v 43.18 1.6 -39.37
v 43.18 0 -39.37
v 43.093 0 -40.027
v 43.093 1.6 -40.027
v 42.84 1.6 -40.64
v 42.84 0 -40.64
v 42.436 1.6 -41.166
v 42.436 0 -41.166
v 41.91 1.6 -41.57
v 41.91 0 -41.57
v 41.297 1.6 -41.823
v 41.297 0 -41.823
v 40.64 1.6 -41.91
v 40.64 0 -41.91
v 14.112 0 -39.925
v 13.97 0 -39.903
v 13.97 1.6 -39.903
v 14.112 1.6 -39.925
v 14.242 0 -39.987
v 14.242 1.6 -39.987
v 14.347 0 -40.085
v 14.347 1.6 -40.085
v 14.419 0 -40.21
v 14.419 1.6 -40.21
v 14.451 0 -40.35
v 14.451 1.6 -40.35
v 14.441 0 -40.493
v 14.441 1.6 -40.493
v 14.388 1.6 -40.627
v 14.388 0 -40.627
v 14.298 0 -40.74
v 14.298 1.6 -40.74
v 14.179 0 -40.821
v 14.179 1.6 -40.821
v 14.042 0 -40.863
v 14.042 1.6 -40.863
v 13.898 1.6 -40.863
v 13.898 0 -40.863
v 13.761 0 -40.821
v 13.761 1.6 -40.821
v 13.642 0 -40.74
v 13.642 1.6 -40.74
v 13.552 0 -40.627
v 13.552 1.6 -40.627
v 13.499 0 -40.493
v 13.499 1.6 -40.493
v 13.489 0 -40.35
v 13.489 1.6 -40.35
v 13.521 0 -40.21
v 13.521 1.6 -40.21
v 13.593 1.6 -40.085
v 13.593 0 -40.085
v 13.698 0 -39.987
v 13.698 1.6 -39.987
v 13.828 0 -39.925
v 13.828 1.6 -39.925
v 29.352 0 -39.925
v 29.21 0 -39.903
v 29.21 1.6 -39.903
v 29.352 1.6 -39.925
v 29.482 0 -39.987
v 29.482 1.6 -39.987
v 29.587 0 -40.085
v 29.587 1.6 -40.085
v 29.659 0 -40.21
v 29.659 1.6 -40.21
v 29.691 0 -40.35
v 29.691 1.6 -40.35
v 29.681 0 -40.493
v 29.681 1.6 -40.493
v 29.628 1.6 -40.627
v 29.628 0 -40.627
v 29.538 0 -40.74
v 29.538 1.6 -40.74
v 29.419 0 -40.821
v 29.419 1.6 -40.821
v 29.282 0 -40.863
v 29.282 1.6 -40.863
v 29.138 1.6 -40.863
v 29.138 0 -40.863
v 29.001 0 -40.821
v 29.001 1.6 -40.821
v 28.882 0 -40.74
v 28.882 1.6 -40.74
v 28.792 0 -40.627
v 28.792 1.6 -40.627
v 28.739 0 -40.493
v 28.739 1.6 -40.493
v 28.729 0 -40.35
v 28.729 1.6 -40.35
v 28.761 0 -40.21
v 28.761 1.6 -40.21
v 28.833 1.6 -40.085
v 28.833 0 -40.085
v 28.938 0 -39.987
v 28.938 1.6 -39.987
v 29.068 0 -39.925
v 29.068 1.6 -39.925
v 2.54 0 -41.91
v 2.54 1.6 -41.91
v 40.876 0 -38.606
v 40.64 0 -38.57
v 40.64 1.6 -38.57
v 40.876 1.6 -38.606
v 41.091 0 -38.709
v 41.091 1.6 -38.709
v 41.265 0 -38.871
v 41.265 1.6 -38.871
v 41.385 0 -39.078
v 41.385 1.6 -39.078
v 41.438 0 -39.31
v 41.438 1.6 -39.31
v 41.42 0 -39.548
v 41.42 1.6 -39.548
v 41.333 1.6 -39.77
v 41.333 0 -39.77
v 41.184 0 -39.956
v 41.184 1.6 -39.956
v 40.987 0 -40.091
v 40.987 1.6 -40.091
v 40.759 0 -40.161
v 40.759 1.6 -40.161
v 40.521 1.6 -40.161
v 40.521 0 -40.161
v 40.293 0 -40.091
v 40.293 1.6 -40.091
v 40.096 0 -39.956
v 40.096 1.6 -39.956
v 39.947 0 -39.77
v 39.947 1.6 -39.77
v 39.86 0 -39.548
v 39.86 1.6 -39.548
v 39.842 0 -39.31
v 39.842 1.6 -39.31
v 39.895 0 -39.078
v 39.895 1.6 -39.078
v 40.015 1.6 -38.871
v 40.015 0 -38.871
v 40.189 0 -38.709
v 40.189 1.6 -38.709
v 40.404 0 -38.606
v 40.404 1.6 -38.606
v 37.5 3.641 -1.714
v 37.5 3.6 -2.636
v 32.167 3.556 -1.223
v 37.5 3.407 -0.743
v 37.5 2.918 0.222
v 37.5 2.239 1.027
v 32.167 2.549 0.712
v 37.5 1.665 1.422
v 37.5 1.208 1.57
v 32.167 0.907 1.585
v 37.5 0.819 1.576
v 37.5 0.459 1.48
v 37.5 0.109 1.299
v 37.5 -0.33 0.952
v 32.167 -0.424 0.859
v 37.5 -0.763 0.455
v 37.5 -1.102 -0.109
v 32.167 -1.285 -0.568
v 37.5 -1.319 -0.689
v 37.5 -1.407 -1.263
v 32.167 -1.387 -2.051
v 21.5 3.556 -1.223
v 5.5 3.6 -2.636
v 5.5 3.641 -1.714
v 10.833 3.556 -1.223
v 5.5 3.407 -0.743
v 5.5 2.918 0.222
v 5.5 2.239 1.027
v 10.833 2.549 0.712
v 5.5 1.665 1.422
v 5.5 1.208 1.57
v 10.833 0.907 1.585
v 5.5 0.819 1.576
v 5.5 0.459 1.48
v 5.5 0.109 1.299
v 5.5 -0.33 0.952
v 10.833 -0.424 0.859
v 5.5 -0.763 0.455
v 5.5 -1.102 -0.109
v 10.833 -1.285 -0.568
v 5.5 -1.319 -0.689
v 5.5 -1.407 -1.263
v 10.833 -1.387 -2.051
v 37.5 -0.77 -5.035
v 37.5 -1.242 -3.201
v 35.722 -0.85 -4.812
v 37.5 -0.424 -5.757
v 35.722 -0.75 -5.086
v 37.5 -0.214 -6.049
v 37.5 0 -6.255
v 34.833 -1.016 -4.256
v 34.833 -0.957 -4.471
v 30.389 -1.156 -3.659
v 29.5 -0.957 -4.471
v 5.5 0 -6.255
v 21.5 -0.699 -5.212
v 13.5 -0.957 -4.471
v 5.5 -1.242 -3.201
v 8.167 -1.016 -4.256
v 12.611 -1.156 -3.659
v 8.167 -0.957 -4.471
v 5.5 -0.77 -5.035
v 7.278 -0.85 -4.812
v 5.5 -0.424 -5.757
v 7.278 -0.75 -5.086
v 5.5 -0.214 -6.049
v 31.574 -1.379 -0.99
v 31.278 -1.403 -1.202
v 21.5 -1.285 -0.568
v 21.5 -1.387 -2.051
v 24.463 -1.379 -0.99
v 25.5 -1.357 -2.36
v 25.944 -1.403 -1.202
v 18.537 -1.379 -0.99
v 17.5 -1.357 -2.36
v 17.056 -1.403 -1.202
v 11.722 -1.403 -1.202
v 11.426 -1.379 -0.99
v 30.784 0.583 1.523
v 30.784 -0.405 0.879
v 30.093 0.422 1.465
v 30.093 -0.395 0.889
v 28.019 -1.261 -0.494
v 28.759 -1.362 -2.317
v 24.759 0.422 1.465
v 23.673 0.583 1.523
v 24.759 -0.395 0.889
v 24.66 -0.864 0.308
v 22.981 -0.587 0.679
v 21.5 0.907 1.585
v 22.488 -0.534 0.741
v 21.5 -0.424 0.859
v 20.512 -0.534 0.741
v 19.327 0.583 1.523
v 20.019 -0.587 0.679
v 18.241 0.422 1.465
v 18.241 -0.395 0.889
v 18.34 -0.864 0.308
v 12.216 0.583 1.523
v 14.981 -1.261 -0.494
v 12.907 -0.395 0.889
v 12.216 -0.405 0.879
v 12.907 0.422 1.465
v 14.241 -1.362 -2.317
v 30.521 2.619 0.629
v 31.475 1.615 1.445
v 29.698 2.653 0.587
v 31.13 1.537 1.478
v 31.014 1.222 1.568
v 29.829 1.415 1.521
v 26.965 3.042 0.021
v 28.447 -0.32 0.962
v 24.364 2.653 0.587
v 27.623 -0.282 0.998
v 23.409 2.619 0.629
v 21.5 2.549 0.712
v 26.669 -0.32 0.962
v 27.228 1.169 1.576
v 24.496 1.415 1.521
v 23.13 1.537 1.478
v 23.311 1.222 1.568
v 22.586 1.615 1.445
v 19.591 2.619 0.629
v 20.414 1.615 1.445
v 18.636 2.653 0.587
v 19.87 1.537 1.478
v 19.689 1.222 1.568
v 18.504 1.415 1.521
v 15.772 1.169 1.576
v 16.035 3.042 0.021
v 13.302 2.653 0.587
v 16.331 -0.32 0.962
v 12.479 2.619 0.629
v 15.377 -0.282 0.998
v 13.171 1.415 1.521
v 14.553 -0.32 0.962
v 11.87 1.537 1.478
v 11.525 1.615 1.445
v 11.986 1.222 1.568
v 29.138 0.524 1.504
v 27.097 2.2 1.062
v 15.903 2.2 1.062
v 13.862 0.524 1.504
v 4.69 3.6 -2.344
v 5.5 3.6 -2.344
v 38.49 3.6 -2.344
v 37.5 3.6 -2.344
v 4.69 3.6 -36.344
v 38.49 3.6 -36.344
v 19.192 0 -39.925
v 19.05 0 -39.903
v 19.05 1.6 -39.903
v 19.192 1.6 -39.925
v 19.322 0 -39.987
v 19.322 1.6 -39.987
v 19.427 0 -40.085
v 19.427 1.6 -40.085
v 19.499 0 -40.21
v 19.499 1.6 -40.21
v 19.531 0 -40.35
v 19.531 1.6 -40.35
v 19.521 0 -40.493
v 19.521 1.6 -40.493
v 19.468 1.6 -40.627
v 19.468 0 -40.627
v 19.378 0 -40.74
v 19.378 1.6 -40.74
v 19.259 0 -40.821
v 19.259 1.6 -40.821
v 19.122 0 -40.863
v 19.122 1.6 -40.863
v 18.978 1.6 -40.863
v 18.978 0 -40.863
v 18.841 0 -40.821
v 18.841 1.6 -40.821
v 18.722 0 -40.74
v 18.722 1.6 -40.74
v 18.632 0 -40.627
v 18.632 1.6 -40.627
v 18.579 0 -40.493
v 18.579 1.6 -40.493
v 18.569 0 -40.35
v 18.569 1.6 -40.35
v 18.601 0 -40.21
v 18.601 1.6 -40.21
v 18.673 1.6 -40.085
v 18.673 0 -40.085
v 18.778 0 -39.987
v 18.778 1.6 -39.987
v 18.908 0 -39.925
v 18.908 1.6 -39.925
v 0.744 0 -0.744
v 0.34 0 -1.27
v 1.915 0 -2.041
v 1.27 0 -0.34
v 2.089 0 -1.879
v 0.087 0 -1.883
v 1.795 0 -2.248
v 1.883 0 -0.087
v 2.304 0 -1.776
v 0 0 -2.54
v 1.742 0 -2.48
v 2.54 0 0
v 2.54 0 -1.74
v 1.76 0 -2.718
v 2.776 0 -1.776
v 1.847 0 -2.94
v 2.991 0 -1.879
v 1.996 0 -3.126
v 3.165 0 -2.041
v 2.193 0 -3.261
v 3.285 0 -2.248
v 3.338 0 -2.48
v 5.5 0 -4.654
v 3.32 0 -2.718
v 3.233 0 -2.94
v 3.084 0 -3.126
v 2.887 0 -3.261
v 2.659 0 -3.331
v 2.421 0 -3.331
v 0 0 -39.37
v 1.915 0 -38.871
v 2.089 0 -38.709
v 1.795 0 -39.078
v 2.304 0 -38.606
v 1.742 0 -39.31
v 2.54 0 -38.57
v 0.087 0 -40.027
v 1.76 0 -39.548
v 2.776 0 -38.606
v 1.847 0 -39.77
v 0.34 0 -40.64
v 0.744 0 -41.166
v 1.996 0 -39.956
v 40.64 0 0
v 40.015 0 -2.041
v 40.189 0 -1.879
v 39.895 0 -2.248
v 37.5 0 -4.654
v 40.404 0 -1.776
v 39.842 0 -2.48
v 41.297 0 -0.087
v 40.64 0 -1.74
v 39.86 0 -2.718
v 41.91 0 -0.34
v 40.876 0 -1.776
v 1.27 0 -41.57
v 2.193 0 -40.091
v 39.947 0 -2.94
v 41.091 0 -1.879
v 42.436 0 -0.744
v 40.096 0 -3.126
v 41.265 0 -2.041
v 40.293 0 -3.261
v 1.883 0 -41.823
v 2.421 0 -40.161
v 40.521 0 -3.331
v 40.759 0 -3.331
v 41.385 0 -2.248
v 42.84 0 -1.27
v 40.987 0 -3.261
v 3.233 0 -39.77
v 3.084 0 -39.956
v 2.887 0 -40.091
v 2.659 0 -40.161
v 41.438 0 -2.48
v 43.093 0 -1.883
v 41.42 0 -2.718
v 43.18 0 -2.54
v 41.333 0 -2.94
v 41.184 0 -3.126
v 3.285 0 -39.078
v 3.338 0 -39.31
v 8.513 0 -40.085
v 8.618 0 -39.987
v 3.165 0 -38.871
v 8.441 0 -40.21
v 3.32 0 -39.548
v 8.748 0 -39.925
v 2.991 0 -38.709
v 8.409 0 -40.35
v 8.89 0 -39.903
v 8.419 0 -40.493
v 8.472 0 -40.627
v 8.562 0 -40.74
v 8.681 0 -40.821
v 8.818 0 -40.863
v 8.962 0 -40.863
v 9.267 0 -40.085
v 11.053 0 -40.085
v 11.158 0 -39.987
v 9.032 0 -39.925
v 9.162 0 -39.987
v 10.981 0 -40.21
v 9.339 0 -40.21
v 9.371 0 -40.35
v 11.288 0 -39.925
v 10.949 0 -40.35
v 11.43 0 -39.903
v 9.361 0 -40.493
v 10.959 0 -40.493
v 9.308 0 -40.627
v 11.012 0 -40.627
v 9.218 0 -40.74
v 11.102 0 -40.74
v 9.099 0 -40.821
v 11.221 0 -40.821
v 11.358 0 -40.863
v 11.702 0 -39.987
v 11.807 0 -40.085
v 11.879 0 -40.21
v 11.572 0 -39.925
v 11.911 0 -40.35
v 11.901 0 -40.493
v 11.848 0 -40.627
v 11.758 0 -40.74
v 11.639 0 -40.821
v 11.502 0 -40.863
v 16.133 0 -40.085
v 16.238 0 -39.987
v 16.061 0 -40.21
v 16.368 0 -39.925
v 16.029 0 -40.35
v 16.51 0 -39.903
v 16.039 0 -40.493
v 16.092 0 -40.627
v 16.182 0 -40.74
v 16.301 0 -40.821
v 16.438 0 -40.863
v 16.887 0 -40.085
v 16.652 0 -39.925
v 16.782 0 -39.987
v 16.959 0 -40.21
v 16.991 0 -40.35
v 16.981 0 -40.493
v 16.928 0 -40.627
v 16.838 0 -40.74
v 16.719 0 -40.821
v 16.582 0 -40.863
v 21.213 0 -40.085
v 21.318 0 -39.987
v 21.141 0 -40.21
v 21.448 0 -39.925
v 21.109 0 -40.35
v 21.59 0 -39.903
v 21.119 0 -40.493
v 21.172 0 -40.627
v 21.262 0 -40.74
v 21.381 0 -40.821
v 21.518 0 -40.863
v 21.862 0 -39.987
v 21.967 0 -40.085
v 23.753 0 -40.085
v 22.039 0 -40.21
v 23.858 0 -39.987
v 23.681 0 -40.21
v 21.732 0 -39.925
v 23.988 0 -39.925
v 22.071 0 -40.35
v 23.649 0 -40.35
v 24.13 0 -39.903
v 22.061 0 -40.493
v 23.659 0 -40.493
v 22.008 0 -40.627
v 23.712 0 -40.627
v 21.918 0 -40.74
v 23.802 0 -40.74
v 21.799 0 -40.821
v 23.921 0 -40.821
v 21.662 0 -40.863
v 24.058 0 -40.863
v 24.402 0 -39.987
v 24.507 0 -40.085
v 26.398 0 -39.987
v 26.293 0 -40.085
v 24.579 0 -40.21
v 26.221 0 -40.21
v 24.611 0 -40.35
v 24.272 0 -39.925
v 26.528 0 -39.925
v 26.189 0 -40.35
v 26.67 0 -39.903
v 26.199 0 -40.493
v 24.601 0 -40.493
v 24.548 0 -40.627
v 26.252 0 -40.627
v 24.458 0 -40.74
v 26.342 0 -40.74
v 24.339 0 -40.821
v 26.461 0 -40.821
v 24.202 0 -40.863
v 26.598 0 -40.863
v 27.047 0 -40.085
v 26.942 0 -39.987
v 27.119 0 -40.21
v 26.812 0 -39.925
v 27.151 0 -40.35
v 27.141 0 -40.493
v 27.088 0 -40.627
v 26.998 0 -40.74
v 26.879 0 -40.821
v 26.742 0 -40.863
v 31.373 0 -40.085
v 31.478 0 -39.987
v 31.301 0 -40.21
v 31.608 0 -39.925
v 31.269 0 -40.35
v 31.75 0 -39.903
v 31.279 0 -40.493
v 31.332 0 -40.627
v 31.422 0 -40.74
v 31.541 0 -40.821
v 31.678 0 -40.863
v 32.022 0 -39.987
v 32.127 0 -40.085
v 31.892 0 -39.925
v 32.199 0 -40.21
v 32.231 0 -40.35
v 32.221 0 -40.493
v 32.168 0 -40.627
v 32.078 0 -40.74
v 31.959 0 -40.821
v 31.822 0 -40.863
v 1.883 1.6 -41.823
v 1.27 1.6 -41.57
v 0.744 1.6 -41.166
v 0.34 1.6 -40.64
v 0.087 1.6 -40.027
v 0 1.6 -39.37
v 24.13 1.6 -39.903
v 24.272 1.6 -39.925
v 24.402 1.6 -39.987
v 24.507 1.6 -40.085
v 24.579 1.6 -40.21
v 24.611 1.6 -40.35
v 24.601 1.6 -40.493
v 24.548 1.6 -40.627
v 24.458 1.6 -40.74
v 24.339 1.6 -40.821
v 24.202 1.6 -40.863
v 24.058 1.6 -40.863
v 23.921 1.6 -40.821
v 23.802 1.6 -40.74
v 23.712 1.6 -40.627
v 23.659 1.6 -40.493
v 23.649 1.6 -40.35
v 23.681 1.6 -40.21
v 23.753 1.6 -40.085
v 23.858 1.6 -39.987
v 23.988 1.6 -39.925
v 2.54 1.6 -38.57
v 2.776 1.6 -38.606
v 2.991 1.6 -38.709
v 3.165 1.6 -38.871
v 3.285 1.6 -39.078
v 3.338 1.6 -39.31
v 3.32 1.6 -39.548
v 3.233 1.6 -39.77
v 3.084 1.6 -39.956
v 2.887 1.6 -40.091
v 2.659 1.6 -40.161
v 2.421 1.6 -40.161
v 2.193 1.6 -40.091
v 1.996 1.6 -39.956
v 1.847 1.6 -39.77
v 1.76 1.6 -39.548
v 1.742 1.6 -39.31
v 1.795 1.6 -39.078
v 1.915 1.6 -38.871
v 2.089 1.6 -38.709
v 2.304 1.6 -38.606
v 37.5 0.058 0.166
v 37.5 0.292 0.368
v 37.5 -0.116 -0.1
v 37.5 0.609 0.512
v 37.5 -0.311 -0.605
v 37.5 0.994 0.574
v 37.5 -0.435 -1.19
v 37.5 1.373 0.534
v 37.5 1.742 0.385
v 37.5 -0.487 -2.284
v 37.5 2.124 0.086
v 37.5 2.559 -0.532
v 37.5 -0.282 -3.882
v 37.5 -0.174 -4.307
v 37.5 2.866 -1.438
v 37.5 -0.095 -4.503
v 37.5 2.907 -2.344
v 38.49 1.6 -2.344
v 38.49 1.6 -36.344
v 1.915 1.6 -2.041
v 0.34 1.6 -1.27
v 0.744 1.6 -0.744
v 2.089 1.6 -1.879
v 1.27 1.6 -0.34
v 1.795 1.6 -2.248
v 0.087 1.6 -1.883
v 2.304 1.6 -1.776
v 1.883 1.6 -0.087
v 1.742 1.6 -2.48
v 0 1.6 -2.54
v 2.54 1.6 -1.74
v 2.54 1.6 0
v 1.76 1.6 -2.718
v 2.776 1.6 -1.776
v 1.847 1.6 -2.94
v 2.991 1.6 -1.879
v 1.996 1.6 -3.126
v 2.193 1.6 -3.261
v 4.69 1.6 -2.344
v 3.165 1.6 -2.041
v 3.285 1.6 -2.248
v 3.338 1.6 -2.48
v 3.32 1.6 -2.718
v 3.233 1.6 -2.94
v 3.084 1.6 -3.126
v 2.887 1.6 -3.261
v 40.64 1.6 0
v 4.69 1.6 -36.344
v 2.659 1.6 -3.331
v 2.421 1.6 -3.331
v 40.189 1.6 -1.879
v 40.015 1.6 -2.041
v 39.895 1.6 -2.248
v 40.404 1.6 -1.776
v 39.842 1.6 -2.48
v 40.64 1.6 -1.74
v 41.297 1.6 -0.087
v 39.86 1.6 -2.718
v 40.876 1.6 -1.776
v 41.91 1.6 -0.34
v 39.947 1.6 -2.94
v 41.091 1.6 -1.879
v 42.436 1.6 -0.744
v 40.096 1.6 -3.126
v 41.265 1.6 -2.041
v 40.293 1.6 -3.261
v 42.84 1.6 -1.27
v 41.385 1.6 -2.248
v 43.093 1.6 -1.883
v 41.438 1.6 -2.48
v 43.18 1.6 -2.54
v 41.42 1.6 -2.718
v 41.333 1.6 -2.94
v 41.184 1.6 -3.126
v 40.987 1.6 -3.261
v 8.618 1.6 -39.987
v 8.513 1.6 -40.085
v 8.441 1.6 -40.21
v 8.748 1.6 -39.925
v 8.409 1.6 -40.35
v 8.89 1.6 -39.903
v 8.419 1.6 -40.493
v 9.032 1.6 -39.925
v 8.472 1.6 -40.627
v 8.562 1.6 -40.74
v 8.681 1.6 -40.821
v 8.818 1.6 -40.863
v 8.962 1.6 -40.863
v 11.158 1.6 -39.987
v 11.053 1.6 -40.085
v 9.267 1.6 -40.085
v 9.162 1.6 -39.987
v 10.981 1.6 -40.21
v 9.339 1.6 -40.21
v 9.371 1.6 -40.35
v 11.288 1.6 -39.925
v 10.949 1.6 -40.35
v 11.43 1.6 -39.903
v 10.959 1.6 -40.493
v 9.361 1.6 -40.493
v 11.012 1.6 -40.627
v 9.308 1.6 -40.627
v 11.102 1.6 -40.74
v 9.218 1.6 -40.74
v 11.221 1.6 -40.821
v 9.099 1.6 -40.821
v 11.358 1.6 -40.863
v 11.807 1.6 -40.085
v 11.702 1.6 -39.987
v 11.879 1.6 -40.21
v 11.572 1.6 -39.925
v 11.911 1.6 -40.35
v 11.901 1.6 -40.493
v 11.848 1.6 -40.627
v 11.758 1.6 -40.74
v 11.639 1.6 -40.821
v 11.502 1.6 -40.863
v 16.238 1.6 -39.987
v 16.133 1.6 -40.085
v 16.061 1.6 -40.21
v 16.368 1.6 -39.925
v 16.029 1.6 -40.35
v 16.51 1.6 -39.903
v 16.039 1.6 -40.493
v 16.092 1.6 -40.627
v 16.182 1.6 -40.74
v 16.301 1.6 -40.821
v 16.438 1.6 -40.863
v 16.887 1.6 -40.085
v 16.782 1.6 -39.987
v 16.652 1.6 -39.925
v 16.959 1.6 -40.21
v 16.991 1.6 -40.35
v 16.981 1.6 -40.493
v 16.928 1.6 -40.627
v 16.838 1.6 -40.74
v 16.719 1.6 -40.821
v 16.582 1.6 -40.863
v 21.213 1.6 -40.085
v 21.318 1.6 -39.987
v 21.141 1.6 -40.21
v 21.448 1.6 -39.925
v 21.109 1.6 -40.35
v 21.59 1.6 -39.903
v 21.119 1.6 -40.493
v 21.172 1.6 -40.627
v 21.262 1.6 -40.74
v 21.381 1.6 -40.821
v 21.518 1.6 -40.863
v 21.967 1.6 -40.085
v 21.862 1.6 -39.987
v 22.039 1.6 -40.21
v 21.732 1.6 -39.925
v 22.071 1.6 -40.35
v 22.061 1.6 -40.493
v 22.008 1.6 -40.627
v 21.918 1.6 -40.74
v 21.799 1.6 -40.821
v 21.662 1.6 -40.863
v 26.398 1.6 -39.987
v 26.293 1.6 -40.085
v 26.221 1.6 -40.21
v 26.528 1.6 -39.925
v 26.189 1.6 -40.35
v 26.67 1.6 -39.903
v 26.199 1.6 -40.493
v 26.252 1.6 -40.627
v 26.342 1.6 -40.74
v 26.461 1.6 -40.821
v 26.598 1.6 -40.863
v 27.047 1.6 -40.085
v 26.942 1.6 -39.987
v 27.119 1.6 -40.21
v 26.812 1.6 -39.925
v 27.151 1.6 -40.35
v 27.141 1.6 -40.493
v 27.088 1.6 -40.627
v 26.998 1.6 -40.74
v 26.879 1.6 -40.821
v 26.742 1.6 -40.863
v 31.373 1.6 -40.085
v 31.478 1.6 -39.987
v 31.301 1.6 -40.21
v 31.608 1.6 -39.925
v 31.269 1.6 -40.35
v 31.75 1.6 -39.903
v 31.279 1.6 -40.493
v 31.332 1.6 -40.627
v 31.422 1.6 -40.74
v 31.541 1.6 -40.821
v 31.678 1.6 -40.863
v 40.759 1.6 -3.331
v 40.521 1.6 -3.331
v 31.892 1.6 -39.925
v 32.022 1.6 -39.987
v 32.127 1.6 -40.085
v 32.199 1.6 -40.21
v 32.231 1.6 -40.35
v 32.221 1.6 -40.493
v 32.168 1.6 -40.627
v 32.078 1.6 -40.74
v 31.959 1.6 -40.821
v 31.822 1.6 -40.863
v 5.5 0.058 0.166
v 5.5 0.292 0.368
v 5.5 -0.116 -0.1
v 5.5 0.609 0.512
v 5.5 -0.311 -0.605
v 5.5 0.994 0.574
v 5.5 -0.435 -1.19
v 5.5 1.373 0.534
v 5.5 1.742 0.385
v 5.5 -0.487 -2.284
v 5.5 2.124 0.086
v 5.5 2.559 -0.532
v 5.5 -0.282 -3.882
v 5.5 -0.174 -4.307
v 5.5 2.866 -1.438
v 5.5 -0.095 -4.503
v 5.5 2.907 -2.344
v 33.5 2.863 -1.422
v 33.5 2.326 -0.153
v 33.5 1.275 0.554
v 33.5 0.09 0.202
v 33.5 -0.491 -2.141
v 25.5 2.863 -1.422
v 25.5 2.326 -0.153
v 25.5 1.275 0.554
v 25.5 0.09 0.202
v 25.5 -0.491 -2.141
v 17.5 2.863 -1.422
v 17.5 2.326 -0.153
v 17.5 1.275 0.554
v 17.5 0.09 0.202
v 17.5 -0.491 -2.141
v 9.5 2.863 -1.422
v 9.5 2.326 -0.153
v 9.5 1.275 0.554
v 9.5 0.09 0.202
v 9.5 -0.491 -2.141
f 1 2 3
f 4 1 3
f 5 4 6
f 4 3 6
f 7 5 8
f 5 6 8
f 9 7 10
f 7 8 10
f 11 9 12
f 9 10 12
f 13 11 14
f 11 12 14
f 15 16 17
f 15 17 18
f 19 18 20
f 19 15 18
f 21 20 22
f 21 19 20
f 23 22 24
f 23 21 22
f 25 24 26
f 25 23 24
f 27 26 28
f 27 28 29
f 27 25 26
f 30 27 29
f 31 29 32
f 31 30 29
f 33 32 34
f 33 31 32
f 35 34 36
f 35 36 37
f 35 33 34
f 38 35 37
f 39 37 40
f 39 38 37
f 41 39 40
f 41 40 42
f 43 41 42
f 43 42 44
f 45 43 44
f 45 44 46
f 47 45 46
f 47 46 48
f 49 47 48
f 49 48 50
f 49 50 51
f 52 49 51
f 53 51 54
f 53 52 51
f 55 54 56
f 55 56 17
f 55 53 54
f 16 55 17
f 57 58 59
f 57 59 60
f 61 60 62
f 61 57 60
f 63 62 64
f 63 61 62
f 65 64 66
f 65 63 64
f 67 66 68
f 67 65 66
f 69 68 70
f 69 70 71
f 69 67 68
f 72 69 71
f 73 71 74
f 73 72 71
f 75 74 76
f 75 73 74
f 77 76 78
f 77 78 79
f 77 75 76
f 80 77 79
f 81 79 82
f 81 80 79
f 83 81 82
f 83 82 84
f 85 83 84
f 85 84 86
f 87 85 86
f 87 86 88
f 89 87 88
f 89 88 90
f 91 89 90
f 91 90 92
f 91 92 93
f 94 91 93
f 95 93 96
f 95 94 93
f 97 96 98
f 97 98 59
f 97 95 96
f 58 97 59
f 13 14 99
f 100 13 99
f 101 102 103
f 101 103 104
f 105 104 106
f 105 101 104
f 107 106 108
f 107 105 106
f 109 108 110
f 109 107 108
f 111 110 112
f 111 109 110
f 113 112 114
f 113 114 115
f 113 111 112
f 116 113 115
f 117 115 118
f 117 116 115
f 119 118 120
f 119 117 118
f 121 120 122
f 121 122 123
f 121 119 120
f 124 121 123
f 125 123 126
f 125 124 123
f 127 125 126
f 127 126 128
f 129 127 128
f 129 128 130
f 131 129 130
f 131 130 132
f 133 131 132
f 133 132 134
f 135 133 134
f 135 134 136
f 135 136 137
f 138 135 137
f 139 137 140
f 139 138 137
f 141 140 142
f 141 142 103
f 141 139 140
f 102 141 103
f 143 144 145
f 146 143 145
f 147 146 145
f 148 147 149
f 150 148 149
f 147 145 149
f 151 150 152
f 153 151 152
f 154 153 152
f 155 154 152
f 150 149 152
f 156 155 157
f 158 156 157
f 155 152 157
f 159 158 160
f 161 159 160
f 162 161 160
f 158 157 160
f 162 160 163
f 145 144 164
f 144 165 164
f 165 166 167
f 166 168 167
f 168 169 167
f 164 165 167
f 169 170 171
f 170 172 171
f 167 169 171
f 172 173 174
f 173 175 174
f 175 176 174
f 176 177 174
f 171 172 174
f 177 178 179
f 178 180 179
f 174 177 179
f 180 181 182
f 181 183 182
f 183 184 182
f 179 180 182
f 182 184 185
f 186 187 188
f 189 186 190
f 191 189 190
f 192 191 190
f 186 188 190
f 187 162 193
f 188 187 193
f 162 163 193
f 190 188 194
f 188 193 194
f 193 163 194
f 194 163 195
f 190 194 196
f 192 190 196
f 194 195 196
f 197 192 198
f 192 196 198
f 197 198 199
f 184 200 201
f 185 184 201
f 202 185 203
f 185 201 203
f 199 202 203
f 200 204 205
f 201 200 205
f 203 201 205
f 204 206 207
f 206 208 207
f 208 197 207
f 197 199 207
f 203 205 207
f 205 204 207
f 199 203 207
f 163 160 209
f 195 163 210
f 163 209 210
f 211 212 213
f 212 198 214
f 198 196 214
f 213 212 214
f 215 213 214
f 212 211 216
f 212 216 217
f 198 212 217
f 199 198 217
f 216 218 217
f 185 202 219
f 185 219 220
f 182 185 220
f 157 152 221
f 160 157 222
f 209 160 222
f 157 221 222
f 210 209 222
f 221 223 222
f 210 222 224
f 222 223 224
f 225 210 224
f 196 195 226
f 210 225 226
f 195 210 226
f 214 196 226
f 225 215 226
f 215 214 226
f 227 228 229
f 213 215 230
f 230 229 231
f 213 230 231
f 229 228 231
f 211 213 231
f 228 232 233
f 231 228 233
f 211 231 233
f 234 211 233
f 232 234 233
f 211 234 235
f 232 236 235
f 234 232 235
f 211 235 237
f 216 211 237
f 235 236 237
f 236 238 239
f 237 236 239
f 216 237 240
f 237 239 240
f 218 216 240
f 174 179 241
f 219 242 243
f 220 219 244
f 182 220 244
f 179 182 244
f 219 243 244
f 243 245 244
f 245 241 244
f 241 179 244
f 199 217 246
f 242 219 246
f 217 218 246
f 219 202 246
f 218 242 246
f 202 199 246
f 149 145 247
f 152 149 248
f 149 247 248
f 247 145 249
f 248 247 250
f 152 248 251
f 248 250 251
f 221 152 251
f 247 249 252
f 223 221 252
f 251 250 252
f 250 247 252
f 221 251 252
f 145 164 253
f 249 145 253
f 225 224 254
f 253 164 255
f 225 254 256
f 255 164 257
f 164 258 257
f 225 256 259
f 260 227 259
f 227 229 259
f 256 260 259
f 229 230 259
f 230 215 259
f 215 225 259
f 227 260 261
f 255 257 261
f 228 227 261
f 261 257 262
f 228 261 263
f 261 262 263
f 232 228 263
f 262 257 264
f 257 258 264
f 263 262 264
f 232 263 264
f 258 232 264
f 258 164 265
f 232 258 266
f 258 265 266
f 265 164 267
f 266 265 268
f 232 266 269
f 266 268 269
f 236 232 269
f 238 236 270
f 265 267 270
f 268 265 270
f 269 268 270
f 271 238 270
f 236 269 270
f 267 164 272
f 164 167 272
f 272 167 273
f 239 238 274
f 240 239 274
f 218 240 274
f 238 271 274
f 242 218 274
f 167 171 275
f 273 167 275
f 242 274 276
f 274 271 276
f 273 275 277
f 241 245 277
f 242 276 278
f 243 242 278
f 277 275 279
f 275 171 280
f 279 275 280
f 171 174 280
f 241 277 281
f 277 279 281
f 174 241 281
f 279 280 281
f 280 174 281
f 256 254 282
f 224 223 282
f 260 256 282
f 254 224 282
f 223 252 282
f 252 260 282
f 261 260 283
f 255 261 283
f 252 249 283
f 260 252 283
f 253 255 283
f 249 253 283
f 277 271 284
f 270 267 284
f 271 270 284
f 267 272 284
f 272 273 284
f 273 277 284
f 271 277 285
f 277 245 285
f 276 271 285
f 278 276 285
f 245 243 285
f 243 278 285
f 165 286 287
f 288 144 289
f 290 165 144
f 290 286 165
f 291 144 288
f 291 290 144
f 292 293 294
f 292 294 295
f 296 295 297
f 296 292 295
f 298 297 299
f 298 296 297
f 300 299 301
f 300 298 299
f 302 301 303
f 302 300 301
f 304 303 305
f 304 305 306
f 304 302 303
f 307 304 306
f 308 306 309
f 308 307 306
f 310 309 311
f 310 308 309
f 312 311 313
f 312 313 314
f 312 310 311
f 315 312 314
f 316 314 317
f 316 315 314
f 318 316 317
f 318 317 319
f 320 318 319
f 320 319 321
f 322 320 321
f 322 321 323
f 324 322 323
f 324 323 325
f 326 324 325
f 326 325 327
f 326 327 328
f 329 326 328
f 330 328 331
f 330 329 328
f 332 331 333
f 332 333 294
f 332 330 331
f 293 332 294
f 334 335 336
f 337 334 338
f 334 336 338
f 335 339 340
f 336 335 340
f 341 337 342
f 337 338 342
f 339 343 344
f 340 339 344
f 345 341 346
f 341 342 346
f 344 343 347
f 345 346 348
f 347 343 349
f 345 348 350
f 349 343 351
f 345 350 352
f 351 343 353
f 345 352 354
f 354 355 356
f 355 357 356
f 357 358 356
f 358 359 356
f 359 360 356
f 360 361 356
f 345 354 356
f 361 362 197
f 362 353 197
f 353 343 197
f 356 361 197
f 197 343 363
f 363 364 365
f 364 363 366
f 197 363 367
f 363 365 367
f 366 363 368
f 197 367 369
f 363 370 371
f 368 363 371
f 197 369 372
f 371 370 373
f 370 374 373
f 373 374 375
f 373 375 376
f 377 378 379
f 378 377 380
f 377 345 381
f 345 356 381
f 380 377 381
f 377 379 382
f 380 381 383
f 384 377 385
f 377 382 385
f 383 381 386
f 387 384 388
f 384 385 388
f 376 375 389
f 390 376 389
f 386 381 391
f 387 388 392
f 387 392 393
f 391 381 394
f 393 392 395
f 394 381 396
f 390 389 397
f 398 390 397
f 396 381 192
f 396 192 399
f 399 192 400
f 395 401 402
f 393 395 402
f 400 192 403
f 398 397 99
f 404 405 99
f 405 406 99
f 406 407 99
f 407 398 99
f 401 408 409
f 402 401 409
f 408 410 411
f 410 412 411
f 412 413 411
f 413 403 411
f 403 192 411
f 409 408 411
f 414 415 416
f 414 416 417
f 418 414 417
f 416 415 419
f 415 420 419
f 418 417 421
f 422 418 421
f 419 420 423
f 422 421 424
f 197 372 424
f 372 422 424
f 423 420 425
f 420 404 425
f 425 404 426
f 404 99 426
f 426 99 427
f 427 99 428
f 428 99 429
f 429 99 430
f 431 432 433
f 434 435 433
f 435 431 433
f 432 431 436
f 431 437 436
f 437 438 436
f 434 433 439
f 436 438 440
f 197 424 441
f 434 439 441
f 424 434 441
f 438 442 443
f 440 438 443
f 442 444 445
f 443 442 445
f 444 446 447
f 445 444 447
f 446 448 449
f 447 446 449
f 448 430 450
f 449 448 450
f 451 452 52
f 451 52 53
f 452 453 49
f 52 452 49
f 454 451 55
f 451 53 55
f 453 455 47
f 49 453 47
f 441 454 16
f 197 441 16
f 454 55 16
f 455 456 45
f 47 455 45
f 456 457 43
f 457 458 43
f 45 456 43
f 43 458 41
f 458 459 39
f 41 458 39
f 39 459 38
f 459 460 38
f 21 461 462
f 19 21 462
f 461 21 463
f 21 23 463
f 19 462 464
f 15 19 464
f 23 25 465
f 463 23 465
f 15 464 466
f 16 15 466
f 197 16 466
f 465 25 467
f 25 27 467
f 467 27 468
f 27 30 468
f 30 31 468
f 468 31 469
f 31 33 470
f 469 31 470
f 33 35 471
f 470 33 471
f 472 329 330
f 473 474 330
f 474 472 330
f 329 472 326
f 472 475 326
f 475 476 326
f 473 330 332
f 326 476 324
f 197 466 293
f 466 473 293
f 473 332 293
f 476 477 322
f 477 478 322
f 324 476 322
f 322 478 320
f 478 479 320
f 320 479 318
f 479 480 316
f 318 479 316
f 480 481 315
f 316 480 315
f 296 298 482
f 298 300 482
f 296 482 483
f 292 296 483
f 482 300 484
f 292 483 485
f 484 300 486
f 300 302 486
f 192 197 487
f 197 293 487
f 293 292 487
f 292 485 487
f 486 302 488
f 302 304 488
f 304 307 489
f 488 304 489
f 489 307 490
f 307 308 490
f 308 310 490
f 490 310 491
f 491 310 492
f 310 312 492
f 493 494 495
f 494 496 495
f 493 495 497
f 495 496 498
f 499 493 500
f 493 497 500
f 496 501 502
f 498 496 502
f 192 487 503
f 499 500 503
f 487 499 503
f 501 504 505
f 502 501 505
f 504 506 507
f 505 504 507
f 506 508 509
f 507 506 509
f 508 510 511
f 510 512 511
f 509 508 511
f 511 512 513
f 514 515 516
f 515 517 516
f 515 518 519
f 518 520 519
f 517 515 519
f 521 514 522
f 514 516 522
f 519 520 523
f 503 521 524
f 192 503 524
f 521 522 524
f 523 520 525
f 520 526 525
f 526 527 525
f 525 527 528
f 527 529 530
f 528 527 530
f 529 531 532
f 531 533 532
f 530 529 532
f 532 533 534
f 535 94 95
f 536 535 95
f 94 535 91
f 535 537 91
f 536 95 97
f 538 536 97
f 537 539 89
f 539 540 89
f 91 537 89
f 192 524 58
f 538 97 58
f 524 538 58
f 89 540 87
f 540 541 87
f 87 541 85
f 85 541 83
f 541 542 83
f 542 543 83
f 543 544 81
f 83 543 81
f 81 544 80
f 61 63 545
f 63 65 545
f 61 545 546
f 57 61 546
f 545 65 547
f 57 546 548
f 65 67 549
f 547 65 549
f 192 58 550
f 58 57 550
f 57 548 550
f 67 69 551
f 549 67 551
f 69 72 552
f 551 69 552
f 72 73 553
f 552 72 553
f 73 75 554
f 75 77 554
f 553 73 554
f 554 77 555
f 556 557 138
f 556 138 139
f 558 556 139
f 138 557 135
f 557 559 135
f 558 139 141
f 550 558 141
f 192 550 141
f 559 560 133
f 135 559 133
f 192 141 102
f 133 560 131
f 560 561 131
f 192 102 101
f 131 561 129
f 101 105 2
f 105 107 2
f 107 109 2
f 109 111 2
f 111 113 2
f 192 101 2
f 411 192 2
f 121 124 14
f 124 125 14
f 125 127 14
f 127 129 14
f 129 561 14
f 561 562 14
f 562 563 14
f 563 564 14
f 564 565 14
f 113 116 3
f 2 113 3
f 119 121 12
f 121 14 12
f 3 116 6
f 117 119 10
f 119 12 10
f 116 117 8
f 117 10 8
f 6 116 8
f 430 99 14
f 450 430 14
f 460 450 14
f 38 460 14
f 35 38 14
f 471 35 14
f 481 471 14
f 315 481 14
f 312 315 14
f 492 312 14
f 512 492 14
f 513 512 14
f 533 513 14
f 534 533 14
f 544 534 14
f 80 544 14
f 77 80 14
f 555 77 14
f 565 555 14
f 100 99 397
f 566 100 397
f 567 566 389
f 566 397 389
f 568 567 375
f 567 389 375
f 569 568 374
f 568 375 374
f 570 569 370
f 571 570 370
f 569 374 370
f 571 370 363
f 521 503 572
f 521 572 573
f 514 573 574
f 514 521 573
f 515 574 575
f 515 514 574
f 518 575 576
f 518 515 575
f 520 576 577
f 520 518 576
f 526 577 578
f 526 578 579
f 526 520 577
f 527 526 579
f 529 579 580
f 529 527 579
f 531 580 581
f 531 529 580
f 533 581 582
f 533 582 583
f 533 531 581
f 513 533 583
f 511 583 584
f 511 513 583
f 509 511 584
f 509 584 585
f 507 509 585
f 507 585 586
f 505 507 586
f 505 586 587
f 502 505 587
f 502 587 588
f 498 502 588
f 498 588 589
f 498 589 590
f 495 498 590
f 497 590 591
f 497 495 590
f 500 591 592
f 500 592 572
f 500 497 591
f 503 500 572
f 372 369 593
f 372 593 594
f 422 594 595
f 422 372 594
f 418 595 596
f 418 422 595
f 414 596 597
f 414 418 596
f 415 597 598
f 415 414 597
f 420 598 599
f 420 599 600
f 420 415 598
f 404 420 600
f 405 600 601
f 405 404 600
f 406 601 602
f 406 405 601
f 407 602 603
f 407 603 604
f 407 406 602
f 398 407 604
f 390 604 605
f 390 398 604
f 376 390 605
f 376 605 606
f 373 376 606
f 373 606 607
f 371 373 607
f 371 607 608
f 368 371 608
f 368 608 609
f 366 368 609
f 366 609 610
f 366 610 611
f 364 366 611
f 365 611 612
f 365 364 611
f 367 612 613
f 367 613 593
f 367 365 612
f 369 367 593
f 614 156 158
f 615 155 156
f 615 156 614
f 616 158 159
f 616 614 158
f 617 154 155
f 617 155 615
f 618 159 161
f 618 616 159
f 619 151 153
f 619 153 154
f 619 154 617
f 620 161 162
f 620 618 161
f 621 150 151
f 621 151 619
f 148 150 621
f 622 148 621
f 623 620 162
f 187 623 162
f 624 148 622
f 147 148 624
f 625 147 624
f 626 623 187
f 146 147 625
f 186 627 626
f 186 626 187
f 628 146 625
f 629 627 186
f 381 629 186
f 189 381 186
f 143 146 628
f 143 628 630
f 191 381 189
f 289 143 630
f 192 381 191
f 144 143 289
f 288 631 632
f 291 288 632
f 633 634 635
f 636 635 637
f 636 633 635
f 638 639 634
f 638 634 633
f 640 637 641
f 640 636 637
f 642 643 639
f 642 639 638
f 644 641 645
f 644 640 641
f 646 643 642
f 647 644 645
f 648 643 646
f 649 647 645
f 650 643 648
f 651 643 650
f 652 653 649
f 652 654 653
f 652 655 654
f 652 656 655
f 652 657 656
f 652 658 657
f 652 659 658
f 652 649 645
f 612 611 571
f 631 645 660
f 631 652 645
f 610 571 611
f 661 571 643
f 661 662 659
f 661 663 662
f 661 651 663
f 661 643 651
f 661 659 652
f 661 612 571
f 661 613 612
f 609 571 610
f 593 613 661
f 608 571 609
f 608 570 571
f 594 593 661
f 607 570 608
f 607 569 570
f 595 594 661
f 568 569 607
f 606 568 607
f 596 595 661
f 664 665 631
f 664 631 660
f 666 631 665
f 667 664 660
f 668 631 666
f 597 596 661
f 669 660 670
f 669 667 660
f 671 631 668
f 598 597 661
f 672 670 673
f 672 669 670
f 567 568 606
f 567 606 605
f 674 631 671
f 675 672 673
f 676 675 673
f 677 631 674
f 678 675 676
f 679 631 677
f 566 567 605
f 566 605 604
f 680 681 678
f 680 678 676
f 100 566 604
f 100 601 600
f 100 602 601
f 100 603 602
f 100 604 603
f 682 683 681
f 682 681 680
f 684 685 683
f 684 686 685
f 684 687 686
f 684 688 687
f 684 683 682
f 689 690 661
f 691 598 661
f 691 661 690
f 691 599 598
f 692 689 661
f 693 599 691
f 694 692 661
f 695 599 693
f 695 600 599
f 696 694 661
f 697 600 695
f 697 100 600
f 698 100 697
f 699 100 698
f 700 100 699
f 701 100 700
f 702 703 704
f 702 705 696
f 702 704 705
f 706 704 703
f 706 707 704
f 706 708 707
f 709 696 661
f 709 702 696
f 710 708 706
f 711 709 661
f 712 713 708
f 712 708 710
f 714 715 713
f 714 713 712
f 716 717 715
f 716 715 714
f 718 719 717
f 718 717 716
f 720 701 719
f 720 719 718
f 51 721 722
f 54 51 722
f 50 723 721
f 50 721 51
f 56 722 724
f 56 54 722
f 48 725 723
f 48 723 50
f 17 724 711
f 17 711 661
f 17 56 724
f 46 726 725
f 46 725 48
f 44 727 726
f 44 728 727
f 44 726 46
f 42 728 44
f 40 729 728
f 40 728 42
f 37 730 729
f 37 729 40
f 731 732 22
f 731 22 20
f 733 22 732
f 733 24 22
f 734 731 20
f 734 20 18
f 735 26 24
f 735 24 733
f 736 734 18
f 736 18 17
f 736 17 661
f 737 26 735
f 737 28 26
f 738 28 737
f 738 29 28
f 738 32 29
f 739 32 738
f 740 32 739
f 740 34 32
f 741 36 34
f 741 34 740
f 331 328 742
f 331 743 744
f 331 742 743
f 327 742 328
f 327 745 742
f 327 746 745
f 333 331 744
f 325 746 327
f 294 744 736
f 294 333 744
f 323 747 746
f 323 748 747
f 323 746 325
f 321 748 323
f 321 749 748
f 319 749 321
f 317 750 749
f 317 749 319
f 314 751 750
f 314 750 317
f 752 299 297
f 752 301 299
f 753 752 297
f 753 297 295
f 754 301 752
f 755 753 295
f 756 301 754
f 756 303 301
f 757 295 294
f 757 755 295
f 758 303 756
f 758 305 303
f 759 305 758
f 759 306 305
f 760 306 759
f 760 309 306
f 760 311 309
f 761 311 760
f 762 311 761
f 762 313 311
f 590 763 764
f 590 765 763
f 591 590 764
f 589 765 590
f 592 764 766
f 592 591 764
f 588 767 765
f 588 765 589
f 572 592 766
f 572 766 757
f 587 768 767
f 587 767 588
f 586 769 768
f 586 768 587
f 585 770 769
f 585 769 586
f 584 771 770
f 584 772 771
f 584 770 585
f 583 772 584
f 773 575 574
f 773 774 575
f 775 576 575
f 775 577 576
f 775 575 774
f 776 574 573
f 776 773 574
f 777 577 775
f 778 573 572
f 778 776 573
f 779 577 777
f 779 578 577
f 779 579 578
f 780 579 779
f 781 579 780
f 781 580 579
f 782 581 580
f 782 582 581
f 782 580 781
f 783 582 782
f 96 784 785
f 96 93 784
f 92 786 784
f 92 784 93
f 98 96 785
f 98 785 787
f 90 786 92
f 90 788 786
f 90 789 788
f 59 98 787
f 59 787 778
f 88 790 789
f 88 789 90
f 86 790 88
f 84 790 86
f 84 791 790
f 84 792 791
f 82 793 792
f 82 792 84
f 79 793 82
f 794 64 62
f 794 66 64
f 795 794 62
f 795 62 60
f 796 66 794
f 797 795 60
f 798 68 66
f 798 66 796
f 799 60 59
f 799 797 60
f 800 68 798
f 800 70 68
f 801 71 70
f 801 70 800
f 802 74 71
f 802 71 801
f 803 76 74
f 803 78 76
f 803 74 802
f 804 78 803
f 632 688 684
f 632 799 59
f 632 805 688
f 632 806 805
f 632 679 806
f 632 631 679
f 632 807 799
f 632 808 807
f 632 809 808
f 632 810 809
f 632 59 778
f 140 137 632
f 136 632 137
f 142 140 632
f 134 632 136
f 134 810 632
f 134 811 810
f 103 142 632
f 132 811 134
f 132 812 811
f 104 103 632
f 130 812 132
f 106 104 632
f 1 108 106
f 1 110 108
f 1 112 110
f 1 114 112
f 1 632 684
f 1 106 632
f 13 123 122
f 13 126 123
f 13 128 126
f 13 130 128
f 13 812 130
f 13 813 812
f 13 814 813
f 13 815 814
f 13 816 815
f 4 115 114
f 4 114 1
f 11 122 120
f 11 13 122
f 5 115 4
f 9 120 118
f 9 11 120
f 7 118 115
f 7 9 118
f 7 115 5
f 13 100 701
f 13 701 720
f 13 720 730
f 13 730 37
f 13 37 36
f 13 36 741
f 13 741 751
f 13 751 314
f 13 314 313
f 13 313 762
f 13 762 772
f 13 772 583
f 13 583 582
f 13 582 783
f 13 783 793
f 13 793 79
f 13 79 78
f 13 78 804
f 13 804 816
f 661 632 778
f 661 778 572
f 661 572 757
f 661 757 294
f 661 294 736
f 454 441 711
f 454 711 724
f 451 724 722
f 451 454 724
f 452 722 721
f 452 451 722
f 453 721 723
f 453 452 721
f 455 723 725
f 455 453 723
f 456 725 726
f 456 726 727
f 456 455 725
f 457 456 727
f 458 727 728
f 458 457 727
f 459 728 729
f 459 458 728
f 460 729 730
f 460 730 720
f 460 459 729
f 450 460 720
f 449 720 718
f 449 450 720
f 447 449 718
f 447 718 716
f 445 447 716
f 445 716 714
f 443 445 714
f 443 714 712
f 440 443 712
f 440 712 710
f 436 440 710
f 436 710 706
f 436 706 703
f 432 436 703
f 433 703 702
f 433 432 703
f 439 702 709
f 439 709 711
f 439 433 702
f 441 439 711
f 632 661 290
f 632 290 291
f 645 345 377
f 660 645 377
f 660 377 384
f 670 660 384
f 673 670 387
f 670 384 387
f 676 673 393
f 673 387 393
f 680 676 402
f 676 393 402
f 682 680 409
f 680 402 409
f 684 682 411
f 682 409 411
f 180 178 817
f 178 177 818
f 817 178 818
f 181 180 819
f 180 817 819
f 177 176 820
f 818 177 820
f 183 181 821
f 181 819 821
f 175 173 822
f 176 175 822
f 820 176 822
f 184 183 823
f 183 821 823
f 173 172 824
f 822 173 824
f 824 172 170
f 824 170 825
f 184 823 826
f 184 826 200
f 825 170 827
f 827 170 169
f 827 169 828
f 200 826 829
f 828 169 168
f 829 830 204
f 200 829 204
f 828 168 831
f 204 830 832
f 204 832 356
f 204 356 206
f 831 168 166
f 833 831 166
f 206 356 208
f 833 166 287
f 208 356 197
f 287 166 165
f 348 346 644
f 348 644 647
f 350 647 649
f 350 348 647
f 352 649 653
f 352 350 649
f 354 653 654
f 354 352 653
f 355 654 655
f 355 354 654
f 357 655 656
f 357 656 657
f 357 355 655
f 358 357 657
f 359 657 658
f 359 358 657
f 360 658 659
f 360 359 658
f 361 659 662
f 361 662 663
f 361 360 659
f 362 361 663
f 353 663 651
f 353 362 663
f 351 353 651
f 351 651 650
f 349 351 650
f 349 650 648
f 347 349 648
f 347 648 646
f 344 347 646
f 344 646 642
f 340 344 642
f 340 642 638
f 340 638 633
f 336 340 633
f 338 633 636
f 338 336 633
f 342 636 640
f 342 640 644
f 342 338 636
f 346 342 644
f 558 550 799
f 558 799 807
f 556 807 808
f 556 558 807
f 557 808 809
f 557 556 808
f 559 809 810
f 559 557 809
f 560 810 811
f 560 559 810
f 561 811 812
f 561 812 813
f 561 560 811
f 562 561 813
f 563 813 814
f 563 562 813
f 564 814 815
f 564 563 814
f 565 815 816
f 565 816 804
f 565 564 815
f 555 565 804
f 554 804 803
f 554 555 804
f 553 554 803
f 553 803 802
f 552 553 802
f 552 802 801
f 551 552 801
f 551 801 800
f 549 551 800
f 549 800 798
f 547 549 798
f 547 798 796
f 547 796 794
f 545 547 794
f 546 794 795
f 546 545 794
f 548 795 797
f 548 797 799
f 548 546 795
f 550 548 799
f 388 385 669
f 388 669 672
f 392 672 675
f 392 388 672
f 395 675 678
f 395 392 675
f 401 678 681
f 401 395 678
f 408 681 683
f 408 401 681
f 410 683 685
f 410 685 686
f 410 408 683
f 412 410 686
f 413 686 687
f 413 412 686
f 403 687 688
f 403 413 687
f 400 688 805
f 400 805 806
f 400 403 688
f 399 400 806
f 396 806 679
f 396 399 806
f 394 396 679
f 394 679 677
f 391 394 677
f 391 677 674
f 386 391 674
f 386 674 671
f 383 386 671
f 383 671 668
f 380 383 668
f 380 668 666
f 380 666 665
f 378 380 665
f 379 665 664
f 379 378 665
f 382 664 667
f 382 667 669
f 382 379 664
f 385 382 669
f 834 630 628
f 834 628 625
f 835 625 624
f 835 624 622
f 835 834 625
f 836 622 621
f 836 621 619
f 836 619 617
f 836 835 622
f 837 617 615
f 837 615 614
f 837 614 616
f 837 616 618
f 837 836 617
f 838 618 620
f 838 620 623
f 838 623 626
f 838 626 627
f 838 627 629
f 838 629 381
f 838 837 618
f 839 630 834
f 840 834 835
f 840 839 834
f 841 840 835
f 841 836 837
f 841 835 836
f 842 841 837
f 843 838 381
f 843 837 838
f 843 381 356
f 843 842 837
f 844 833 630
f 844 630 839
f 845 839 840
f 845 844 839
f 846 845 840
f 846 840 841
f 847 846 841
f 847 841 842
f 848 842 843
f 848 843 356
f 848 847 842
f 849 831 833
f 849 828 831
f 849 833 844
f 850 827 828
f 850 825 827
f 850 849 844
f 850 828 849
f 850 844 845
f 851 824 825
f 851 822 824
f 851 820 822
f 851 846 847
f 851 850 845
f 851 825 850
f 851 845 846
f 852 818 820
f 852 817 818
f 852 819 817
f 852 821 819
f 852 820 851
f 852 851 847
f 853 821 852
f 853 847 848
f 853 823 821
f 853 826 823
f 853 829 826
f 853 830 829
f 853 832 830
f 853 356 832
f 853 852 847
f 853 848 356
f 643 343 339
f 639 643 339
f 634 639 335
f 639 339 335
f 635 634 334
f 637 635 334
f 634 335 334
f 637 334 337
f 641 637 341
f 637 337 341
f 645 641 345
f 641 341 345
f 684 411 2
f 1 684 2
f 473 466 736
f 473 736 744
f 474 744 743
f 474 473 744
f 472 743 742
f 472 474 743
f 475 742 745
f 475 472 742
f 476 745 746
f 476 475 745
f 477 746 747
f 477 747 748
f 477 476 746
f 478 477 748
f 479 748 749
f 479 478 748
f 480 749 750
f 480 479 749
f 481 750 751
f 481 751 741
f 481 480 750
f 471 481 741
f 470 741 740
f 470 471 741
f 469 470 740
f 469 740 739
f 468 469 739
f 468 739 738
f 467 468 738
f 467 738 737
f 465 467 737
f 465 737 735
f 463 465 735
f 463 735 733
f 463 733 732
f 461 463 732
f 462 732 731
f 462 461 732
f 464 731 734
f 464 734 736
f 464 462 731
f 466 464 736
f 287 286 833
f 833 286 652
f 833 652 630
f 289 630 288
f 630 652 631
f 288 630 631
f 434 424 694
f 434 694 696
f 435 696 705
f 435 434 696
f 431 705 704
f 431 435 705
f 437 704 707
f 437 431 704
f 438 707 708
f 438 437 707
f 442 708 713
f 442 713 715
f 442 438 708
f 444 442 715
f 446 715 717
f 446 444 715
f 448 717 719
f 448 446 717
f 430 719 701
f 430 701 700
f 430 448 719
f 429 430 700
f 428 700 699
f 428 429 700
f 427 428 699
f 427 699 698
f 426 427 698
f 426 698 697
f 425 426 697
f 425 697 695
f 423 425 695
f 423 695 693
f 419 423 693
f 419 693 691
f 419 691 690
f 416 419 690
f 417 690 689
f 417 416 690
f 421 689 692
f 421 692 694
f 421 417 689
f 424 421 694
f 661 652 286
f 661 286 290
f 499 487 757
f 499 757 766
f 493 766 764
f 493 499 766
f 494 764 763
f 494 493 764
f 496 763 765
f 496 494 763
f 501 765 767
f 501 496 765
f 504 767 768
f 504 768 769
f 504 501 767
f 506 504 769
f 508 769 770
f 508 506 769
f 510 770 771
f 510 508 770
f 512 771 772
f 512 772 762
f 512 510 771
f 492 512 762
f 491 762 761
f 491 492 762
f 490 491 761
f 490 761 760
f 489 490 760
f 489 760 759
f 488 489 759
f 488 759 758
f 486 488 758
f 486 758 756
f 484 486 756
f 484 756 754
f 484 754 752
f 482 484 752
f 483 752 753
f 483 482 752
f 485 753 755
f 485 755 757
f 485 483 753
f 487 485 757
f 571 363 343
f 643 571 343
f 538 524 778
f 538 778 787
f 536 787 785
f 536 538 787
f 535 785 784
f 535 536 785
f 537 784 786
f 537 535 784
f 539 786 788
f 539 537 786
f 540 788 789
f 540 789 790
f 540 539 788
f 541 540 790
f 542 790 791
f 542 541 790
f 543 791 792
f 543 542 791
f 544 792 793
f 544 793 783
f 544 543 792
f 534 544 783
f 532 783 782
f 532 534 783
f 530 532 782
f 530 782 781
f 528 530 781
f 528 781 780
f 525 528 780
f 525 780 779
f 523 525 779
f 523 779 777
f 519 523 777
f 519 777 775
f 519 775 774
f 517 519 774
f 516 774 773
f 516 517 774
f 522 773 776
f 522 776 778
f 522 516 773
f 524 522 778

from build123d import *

# Parameters (mm, degrees)
SKETCH1_R           = 0.8
SKETCH1_R_2         = 0.4826
BOSS_EXTRUDE1_DEPTH = 1.6
SKETCH2_W           = 33.8
SKETCH2_H           = 34
BOSS_EXTRUDE2_DEPTH = 2
BOSS_EXTRUDE3_START = 5.5
BOSS_EXTRUDE3_DEPTH = 32


with BuildPart() as part:
    # Sketch1 → Boss-Extrude1 (new body)
    with BuildSketch(Plane(origin=(0, 0, 0), x_dir=(1, 0, 0), z_dir=(0, 1, 0))):
        with BuildLine():
            Line((40.64, 41.91), (2.54, 41.91))
            ThreePointArc((2.54, 41.91), (0.743948776, 41.166051224), (0, 39.37))
            Line((0, 39.37), (0, 2.54))
            ThreePointArc((0, 2.54), (0.743948776, 0.743948776), (2.54, 0))
            Line((2.54, 0), (40.64, 0))
            ThreePointArc((40.64, 0), (42.436051224, 0.743948776), (43.18, 2.54))
            Line((43.18, 2.54), (43.18, 39.37))
            ThreePointArc((43.18, 39.37), (42.436051224, 41.166051224), (40.64, 41.91))
        make_face()
        with Locations(Location((2.54, 39.37, 0), (0, 0, 270))):
            Circle(SKETCH1_R, mode=Mode.SUBTRACT)
        with Locations(Location((40.64, 39.37, 0), (0, 0, 270))):
            Circle(SKETCH1_R, mode=Mode.SUBTRACT)
        with Locations(Location((40.64, 2.54, 0), (0, 0, 270))):
            Circle(SKETCH1_R, mode=Mode.SUBTRACT)
        with Locations(Location((2.54, 2.54, 0), (0, 0, 270))):
            Circle(SKETCH1_R, mode=Mode.SUBTRACT)
        with Locations(Location((8.89, 40.386, 0), (0, 0, 270))):
            Circle(SKETCH1_R_2, mode=Mode.SUBTRACT)
        with Locations(Location((11.43, 40.386, 0), (0, 0, 270))):
            Circle(SKETCH1_R_2, mode=Mode.SUBTRACT)
        with Locations(Location((13.97, 40.386, 0), (0, 0, 270))):
            Circle(SKETCH1_R_2, mode=Mode.SUBTRACT)
        with Locations(Location((16.51, 40.386, 0), (0, 0, 270))):
            Circle(SKETCH1_R_2, mode=Mode.SUBTRACT)
        with Locations(Location((19.05, 40.386, 0), (0, 0, 270))):
            Circle(SKETCH1_R_2, mode=Mode.SUBTRACT)
        with Locations(Location((21.59, 40.386, 0), (0, 0, 270))):
            Circle(SKETCH1_R_2, mode=Mode.SUBTRACT)
        with Locations(Location((24.13, 40.386, 0), (0, 0, 270))):
            Circle(SKETCH1_R_2, mode=Mode.SUBTRACT)
        with Locations(Location((26.67, 40.386, 0), (0, 0, 270))):
            Circle(SKETCH1_R_2, mode=Mode.SUBTRACT)
        with Locations(Location((29.21, 40.386, 0), (0, 0, 270))):
            Circle(SKETCH1_R_2, mode=Mode.SUBTRACT)
        with Locations(Location((31.75, 40.386, 0), (0, 0, 270))):
            Circle(SKETCH1_R_2, mode=Mode.SUBTRACT)
    extrude(amount=BOSS_EXTRUDE1_DEPTH)

    # Sketch2 → Boss-Extrude2 (add)
    with BuildSketch(Plane(origin=(0, 1.6, 0), x_dir=(1, 0, 0), z_dir=(0, 1, 0))):
        with Locations((21.59, 19.343844511)):
            Rectangle(SKETCH2_W, SKETCH2_H)
    extrude(amount=BOSS_EXTRUDE2_DEPTH)

    # Sketch3 → Boss-Extrude3 (add)
    with BuildSketch(Plane(origin=(0, 0, 0), x_dir=(0, 0, -1), z_dir=(1, 0, 0)).offset(BOSS_EXTRUDE3_START)):
        with BuildLine():
            add(Edge.make_bspline(
                [(3.970164527, 3.105314779), (3.04053349, 3.600811343), (1.003377892, 4.056892842), (-2.896061137, 1.167055459), (0.099995748, -1.437870681), (2.983164085, -1.424066333), (8.281609372, -0.229546042), (5.182542742, 2.459112989), (3.970164527, 3.105314779)],
                knots=[0, 0, 0, 0, 0.142117757, 0.339134201, 0.495976707, 0.571841856, 0.814657142, 1, 1, 1, 1], degree=3))
        make_face()
        with BuildLine():
            add(Edge.make_bspline(
                [(4.08176927, 2.23180389), (3.305339462, 2.783945066), (1.536004114, 3.293046243), (-0.859930314, 1.862739832), (-0.461561334, 0.171086046), (1.128981968, -0.665819715), (3.168129753, -0.489558726), (4.994967134, 0.005583457), (5.157624087, 1.295448967), (4.40957126, 1.998694632), (4.08176927, 2.23180389)],
                knots=[0, 0, 0, 0, 0.200568943, 0.386570944, 0.476143886, 0.515165973, 0.747722274, 0.790644782, 0.915321516, 1, 1, 1, 1], degree=3))
        make_face(mode=Mode.SUBTRACT)
    extrude(amount=BOSS_EXTRUDE3_DEPTH)


solid = part.part
